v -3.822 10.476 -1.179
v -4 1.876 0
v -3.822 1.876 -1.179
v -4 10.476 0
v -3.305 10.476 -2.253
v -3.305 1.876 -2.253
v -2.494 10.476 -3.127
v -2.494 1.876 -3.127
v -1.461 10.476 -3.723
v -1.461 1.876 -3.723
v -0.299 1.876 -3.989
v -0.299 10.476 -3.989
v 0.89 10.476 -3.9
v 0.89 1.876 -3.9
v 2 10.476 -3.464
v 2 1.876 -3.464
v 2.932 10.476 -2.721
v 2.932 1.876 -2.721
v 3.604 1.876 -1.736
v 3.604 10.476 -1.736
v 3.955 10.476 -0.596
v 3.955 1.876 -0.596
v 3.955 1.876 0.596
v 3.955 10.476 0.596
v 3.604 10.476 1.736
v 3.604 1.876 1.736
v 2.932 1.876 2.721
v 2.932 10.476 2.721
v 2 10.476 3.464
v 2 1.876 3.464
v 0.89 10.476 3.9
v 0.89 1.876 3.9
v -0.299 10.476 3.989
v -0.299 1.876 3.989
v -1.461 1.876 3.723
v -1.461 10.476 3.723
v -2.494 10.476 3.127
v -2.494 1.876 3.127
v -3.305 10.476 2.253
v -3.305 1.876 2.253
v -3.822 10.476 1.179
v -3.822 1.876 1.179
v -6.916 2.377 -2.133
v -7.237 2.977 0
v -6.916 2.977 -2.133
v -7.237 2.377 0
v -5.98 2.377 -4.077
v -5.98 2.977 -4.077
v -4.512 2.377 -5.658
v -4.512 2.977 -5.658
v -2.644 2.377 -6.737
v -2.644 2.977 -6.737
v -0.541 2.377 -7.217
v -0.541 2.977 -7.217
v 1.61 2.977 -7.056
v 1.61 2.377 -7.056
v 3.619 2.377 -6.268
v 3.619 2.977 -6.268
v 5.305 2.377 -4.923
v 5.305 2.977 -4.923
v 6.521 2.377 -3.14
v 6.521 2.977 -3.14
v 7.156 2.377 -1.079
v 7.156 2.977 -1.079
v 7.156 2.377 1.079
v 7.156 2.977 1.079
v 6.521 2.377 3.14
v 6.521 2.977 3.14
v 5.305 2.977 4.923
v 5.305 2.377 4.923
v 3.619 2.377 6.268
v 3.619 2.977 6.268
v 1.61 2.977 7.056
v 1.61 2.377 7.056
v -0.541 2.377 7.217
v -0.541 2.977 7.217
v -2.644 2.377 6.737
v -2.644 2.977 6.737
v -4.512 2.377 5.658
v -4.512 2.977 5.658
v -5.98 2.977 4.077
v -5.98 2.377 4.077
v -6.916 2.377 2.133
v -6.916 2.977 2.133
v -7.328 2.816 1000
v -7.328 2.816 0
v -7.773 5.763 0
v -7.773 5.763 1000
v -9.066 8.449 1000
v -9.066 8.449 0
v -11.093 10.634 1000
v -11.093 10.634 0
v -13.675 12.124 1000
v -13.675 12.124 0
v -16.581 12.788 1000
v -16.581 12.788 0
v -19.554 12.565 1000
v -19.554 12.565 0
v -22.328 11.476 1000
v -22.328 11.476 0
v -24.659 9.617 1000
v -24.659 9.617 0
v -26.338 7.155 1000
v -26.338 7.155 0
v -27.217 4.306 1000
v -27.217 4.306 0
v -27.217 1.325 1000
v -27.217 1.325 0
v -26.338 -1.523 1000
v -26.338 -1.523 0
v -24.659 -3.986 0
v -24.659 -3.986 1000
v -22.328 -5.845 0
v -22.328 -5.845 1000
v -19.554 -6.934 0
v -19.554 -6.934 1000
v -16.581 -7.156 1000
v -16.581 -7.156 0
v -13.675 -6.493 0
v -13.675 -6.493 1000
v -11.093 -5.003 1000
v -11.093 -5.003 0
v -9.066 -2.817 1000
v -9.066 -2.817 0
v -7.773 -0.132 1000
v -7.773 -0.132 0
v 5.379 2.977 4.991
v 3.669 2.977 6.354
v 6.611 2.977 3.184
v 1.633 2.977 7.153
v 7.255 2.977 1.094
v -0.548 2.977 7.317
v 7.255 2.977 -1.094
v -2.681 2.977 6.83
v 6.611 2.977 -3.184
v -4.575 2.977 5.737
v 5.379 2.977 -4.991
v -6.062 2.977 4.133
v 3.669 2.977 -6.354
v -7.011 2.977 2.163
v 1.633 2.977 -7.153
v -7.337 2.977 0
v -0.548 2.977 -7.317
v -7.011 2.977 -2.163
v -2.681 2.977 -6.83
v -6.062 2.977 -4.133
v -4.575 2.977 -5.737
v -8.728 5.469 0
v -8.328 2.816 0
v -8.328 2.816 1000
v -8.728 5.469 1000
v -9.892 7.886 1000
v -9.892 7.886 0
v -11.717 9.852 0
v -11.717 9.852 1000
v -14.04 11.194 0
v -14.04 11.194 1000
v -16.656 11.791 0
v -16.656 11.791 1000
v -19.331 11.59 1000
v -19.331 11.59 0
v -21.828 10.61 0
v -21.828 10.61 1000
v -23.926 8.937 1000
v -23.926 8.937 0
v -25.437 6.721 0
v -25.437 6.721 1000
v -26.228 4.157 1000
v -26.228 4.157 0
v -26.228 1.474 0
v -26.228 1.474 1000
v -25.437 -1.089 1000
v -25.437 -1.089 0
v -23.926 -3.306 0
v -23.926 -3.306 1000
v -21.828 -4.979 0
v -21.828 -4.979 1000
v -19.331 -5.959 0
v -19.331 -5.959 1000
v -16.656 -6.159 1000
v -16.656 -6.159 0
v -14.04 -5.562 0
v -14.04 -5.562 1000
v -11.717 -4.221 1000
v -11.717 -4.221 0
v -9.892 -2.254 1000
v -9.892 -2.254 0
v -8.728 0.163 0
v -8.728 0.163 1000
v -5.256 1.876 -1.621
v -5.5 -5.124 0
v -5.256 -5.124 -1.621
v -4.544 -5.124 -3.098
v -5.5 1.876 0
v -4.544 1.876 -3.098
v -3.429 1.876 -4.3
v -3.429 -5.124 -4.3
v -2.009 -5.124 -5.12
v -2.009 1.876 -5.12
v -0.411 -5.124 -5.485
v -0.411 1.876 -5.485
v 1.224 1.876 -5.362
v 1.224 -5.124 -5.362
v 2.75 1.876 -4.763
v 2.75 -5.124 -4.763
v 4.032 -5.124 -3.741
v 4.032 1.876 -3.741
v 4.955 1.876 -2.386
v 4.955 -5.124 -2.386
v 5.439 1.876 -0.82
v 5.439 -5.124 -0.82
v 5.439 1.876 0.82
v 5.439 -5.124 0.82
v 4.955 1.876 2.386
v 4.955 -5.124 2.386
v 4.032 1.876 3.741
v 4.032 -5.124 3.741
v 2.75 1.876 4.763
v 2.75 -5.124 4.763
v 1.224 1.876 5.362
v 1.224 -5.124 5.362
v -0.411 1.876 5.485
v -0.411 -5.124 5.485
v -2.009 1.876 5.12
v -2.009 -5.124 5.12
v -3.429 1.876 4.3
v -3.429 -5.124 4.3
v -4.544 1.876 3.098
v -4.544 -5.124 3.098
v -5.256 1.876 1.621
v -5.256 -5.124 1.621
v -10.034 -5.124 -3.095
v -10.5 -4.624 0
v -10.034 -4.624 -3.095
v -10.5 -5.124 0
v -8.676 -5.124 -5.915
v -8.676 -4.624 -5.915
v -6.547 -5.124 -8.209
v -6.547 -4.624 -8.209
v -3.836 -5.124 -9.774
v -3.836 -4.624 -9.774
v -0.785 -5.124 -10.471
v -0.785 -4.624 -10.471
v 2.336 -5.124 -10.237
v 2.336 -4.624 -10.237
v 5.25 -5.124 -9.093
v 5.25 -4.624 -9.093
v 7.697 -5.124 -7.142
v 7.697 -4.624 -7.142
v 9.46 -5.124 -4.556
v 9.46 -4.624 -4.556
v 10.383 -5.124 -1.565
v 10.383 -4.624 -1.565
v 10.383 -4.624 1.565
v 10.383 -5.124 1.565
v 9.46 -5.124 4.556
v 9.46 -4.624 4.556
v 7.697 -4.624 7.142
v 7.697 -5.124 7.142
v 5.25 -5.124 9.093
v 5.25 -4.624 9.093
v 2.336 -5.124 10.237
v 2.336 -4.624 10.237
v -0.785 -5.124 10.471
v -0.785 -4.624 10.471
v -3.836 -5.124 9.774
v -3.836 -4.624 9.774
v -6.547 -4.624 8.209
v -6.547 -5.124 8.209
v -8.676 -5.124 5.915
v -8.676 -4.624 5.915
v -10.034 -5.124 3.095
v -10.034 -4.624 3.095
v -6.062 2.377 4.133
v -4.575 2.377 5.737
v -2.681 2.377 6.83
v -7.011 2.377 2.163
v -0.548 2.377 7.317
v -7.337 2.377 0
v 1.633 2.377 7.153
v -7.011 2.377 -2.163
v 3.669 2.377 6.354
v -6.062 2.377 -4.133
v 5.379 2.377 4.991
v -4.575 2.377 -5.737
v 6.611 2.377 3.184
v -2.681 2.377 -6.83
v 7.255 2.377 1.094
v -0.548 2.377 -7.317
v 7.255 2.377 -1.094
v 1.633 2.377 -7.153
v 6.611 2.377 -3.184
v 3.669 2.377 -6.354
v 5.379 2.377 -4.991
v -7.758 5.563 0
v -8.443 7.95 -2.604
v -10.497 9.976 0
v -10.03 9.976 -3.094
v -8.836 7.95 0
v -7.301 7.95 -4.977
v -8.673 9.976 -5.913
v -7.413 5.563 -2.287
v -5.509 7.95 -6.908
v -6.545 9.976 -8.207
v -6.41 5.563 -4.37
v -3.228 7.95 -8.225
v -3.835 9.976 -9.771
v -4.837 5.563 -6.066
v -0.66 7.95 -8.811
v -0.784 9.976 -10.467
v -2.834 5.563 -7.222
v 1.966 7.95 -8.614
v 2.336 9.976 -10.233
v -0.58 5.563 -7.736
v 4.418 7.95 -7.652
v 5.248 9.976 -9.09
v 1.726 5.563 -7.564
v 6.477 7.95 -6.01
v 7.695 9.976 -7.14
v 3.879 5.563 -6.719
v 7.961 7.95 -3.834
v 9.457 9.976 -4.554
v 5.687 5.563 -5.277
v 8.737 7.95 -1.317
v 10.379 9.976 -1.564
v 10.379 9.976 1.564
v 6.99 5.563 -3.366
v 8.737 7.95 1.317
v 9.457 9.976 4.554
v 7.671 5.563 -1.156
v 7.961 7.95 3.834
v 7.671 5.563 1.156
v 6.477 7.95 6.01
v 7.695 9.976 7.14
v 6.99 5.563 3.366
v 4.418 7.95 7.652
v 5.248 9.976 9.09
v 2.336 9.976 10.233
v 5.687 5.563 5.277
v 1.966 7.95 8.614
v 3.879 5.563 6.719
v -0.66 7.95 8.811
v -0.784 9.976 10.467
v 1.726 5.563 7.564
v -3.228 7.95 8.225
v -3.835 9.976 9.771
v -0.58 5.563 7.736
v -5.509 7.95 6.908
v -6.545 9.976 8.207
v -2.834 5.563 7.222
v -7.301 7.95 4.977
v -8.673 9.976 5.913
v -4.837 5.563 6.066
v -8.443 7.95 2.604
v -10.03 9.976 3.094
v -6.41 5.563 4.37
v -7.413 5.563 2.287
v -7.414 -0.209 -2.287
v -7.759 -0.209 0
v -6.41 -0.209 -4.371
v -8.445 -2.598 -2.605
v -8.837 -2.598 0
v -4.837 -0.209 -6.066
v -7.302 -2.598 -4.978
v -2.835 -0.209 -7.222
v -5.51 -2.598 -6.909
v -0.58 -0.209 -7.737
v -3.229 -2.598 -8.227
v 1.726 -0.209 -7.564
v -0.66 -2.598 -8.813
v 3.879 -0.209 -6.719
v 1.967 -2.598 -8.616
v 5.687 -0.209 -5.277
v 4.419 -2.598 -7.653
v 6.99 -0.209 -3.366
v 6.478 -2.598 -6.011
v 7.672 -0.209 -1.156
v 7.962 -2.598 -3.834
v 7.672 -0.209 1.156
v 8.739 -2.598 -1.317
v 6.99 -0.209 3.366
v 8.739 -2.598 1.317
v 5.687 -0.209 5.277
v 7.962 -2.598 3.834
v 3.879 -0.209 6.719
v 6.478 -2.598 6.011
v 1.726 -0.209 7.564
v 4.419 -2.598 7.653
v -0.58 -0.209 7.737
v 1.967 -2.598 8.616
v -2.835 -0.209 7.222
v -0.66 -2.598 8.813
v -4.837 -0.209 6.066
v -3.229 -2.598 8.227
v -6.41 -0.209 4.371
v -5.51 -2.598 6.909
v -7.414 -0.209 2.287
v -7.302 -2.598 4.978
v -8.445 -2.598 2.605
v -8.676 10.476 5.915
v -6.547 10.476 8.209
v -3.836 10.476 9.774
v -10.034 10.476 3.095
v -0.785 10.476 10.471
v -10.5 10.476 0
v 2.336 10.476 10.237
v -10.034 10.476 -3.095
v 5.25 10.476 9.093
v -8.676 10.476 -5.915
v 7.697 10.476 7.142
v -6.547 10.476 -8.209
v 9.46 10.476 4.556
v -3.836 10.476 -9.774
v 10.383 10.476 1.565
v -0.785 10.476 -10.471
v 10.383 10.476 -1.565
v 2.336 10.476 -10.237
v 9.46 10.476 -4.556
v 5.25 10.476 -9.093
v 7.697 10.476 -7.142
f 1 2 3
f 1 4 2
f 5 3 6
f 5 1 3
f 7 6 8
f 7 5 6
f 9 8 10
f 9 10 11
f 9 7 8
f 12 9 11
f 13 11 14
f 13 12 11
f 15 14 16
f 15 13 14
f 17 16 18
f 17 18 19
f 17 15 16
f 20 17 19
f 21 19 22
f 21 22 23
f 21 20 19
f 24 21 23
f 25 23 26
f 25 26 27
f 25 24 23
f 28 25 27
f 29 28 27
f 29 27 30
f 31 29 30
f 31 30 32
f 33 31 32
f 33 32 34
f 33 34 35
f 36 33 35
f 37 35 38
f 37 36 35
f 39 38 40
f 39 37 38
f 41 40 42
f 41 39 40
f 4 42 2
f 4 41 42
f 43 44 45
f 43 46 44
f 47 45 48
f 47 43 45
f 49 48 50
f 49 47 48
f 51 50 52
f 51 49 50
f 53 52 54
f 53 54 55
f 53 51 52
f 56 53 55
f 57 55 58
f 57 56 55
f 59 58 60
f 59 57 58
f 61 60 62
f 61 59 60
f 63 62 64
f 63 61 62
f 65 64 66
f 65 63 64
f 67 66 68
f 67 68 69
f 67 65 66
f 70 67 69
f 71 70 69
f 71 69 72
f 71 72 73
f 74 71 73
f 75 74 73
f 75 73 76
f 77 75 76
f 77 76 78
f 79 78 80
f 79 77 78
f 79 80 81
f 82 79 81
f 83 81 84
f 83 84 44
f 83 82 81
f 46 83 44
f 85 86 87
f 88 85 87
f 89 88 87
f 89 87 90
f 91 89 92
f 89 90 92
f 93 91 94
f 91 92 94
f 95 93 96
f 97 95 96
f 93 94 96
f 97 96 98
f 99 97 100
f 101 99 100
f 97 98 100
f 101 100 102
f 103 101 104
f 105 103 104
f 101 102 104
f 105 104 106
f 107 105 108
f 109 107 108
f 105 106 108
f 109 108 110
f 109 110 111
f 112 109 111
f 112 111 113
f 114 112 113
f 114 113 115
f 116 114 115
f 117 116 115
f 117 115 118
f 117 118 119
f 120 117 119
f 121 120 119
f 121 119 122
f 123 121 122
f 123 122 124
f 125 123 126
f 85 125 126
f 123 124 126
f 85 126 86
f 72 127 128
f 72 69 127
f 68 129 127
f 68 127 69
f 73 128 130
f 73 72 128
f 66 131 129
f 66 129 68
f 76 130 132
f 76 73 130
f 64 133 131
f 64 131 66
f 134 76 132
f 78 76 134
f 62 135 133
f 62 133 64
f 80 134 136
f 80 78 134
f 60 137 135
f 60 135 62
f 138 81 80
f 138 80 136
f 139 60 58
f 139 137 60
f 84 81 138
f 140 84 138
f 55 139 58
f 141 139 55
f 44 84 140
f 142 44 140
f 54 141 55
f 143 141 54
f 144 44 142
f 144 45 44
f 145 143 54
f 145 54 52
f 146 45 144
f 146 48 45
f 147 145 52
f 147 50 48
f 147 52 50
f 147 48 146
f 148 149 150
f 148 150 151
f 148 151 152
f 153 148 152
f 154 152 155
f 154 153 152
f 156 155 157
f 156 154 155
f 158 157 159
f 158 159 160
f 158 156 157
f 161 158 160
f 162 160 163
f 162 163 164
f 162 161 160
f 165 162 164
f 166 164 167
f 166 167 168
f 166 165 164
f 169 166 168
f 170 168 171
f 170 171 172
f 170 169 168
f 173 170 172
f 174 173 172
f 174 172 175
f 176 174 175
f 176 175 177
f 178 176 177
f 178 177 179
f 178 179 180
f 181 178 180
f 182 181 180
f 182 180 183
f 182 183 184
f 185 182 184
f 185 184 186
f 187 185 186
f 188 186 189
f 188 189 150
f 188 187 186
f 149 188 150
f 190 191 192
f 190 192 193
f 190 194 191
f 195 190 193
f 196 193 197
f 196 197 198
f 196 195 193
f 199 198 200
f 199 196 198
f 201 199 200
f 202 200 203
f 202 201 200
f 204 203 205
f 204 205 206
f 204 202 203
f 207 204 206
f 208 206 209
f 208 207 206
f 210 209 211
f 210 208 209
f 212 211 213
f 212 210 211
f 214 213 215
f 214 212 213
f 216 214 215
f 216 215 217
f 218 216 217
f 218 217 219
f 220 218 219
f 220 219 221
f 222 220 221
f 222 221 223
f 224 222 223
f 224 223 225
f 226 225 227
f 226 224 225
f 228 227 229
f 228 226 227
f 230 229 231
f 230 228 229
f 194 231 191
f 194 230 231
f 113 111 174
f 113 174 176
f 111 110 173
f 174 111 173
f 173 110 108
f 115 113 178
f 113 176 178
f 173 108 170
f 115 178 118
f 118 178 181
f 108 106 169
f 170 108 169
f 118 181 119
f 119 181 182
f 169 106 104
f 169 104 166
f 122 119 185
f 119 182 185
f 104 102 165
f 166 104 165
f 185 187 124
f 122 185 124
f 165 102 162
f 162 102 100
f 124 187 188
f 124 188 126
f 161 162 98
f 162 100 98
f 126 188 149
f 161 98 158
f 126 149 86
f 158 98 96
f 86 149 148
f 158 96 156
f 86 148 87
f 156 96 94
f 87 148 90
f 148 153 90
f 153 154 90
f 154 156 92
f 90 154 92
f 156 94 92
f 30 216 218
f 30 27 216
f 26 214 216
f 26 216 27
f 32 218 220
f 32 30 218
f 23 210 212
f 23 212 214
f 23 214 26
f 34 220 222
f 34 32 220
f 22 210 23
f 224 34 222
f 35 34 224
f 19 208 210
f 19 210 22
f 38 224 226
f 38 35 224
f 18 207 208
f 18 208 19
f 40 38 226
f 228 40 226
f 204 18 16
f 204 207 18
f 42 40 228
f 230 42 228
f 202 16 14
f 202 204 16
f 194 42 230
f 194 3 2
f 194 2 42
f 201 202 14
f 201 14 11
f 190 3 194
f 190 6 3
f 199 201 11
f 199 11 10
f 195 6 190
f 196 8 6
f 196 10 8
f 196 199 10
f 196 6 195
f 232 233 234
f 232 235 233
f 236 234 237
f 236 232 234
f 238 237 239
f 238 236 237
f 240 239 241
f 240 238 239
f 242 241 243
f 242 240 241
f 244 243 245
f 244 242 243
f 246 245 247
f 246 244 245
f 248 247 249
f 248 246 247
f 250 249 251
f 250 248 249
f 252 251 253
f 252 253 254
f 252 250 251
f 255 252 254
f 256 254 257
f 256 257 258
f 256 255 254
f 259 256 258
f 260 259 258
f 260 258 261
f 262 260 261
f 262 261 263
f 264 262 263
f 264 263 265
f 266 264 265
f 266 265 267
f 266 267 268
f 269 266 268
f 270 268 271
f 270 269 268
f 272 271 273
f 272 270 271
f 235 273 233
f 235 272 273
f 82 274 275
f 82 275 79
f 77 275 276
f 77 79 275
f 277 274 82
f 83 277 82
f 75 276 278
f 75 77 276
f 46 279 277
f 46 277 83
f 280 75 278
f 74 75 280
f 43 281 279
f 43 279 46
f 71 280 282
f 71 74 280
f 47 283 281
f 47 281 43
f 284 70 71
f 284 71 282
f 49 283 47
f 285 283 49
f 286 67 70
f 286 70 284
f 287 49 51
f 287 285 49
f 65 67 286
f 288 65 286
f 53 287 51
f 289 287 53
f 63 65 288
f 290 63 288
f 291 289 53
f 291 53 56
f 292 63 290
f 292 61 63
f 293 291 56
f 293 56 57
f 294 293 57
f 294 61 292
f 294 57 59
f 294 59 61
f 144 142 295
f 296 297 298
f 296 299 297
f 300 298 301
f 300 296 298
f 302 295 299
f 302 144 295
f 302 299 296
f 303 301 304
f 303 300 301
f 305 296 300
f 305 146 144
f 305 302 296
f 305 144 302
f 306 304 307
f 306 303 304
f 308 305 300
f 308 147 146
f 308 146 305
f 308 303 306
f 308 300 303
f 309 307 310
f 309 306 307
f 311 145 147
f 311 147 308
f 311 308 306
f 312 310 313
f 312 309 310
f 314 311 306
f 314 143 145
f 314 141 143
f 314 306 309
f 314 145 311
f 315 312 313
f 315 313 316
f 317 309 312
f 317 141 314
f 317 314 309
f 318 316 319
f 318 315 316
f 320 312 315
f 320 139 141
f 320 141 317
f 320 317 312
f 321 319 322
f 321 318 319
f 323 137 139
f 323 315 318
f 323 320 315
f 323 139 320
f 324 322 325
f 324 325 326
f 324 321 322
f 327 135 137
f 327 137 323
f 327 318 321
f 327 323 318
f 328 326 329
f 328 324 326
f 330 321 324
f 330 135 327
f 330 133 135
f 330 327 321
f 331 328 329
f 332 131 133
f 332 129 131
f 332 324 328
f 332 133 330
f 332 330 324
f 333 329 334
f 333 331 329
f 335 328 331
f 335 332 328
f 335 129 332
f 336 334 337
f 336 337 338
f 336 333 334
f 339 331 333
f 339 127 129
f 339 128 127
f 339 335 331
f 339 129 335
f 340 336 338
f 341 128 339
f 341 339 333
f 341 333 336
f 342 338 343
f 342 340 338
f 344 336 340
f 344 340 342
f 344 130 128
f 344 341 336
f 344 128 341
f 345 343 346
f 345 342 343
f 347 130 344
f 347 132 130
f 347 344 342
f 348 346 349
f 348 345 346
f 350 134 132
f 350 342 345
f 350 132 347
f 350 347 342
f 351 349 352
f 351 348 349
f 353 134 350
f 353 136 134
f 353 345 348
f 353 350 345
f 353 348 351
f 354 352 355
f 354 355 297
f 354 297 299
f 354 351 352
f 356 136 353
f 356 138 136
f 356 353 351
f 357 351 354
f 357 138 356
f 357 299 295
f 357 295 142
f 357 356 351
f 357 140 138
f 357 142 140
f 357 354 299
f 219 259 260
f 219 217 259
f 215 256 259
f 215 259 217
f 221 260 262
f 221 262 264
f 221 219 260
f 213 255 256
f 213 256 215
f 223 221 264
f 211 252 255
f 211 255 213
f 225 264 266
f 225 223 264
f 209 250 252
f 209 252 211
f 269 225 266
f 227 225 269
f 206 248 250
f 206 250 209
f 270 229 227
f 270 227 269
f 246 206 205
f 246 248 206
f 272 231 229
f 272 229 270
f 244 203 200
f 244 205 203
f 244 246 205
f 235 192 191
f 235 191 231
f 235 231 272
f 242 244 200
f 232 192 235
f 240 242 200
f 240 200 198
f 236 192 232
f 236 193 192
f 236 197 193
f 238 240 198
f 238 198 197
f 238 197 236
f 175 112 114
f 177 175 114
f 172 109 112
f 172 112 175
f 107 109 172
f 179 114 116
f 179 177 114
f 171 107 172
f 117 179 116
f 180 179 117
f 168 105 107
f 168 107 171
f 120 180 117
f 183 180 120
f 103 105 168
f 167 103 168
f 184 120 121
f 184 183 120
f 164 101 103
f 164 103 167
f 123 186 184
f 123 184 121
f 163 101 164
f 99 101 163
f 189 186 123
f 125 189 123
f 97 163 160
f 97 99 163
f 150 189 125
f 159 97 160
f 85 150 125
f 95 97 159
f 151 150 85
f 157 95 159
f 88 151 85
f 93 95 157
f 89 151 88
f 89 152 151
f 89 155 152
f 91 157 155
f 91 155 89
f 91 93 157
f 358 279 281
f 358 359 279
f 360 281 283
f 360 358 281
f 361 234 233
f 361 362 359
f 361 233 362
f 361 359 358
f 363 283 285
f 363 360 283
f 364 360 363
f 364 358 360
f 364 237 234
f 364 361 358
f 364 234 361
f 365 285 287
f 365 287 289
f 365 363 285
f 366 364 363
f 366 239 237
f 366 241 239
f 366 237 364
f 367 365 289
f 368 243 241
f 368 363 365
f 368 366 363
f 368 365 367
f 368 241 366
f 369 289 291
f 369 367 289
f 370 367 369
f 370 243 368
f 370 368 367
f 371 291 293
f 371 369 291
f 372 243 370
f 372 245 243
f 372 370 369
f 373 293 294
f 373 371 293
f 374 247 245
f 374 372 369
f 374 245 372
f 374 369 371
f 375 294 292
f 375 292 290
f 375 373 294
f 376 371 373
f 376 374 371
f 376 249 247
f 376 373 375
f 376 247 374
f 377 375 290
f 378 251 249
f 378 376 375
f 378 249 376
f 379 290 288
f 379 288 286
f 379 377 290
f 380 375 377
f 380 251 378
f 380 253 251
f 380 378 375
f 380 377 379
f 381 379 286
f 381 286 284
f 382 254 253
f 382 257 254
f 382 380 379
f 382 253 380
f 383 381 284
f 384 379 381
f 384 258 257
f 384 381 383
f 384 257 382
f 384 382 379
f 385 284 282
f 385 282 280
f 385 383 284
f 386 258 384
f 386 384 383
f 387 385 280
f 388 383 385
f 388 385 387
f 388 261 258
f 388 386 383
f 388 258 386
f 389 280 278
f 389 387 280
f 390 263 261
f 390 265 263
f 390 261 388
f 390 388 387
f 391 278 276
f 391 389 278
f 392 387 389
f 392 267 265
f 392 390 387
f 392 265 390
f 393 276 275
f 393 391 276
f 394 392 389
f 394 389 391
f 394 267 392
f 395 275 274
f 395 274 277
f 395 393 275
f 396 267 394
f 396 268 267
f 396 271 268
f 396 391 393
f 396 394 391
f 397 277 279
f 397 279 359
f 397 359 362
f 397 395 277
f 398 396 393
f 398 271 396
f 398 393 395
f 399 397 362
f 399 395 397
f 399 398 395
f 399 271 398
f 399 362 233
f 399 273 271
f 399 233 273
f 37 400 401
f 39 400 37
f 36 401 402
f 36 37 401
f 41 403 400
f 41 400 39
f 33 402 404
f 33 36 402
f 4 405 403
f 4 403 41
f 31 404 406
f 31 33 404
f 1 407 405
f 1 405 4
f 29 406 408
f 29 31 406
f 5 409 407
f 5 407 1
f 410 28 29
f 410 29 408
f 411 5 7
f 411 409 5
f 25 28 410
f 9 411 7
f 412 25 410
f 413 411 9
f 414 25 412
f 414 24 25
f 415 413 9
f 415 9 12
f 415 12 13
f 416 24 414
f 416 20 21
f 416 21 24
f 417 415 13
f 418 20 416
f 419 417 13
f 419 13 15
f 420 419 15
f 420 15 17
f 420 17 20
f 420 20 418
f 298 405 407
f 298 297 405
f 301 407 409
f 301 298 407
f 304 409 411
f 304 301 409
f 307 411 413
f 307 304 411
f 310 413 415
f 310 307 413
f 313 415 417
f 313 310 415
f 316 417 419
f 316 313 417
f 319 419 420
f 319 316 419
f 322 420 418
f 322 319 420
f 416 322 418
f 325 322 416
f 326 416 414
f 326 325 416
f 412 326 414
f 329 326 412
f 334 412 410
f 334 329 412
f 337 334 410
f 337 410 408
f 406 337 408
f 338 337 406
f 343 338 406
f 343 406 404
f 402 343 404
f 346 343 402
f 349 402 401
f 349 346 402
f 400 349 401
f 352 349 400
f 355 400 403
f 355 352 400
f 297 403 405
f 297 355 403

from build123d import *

# Parameters (mm, degrees)
F2_R     = 10
F2_R_2   = 9
F3_DEPTH = 1000


with BuildPart() as f1:
    # F0 (on Top) → F1 (revolve)
    with BuildSketch(Plane.XY):
        with BuildLine():
            Line((-4, 1.875795), (-4, 10.475795))
            Line((-4, 10.475795), (-10.5, 10.475795))
            Line((-10.5, 10.475795), (-10.496641, 9.975806))
            ThreePointArc((-10.496641, 9.975806), (-8.21848, 6.791912), (-7.337287, 2.977373))
            Line((-7.337287, 2.977373), (-7.237287, 2.977373))
            Line((-7.237287, 2.977373), (-7.237287, 2.377373))
            Line((-7.237287, 2.377373), (-7.337287, 2.377373))
            ThreePointArc((-7.337287, 2.377373), (-8.219426, -1.439262), (-10.5, -4.624205))
            Line((-10.5, -4.624205), (-10.5, -5.124205))
            Line((-10.5, -5.124205), (-5.5, -5.124205))
            Line((-5.5, -5.124205), (-5.5, 1.875795))
            Line((-5.5, 1.875795), (-4, 1.875795))
        make_face()
    revolve(axis=Axis((0, 2.00804, 0), (0, -1, 0)))


with BuildPart() as f3:
    # F2 (on Top) → F3 (new body)
    with BuildSketch(Plane.XY):
        with Locations((-17.328329, 2.815727)):
            Circle(F2_R)
        with Locations((-17.328329, 2.815727)):
            Circle(F2_R_2, mode=Mode.SUBTRACT)
    extrude(amount=F3_DEPTH)


solid = Compound([f1.part, f3.part])
